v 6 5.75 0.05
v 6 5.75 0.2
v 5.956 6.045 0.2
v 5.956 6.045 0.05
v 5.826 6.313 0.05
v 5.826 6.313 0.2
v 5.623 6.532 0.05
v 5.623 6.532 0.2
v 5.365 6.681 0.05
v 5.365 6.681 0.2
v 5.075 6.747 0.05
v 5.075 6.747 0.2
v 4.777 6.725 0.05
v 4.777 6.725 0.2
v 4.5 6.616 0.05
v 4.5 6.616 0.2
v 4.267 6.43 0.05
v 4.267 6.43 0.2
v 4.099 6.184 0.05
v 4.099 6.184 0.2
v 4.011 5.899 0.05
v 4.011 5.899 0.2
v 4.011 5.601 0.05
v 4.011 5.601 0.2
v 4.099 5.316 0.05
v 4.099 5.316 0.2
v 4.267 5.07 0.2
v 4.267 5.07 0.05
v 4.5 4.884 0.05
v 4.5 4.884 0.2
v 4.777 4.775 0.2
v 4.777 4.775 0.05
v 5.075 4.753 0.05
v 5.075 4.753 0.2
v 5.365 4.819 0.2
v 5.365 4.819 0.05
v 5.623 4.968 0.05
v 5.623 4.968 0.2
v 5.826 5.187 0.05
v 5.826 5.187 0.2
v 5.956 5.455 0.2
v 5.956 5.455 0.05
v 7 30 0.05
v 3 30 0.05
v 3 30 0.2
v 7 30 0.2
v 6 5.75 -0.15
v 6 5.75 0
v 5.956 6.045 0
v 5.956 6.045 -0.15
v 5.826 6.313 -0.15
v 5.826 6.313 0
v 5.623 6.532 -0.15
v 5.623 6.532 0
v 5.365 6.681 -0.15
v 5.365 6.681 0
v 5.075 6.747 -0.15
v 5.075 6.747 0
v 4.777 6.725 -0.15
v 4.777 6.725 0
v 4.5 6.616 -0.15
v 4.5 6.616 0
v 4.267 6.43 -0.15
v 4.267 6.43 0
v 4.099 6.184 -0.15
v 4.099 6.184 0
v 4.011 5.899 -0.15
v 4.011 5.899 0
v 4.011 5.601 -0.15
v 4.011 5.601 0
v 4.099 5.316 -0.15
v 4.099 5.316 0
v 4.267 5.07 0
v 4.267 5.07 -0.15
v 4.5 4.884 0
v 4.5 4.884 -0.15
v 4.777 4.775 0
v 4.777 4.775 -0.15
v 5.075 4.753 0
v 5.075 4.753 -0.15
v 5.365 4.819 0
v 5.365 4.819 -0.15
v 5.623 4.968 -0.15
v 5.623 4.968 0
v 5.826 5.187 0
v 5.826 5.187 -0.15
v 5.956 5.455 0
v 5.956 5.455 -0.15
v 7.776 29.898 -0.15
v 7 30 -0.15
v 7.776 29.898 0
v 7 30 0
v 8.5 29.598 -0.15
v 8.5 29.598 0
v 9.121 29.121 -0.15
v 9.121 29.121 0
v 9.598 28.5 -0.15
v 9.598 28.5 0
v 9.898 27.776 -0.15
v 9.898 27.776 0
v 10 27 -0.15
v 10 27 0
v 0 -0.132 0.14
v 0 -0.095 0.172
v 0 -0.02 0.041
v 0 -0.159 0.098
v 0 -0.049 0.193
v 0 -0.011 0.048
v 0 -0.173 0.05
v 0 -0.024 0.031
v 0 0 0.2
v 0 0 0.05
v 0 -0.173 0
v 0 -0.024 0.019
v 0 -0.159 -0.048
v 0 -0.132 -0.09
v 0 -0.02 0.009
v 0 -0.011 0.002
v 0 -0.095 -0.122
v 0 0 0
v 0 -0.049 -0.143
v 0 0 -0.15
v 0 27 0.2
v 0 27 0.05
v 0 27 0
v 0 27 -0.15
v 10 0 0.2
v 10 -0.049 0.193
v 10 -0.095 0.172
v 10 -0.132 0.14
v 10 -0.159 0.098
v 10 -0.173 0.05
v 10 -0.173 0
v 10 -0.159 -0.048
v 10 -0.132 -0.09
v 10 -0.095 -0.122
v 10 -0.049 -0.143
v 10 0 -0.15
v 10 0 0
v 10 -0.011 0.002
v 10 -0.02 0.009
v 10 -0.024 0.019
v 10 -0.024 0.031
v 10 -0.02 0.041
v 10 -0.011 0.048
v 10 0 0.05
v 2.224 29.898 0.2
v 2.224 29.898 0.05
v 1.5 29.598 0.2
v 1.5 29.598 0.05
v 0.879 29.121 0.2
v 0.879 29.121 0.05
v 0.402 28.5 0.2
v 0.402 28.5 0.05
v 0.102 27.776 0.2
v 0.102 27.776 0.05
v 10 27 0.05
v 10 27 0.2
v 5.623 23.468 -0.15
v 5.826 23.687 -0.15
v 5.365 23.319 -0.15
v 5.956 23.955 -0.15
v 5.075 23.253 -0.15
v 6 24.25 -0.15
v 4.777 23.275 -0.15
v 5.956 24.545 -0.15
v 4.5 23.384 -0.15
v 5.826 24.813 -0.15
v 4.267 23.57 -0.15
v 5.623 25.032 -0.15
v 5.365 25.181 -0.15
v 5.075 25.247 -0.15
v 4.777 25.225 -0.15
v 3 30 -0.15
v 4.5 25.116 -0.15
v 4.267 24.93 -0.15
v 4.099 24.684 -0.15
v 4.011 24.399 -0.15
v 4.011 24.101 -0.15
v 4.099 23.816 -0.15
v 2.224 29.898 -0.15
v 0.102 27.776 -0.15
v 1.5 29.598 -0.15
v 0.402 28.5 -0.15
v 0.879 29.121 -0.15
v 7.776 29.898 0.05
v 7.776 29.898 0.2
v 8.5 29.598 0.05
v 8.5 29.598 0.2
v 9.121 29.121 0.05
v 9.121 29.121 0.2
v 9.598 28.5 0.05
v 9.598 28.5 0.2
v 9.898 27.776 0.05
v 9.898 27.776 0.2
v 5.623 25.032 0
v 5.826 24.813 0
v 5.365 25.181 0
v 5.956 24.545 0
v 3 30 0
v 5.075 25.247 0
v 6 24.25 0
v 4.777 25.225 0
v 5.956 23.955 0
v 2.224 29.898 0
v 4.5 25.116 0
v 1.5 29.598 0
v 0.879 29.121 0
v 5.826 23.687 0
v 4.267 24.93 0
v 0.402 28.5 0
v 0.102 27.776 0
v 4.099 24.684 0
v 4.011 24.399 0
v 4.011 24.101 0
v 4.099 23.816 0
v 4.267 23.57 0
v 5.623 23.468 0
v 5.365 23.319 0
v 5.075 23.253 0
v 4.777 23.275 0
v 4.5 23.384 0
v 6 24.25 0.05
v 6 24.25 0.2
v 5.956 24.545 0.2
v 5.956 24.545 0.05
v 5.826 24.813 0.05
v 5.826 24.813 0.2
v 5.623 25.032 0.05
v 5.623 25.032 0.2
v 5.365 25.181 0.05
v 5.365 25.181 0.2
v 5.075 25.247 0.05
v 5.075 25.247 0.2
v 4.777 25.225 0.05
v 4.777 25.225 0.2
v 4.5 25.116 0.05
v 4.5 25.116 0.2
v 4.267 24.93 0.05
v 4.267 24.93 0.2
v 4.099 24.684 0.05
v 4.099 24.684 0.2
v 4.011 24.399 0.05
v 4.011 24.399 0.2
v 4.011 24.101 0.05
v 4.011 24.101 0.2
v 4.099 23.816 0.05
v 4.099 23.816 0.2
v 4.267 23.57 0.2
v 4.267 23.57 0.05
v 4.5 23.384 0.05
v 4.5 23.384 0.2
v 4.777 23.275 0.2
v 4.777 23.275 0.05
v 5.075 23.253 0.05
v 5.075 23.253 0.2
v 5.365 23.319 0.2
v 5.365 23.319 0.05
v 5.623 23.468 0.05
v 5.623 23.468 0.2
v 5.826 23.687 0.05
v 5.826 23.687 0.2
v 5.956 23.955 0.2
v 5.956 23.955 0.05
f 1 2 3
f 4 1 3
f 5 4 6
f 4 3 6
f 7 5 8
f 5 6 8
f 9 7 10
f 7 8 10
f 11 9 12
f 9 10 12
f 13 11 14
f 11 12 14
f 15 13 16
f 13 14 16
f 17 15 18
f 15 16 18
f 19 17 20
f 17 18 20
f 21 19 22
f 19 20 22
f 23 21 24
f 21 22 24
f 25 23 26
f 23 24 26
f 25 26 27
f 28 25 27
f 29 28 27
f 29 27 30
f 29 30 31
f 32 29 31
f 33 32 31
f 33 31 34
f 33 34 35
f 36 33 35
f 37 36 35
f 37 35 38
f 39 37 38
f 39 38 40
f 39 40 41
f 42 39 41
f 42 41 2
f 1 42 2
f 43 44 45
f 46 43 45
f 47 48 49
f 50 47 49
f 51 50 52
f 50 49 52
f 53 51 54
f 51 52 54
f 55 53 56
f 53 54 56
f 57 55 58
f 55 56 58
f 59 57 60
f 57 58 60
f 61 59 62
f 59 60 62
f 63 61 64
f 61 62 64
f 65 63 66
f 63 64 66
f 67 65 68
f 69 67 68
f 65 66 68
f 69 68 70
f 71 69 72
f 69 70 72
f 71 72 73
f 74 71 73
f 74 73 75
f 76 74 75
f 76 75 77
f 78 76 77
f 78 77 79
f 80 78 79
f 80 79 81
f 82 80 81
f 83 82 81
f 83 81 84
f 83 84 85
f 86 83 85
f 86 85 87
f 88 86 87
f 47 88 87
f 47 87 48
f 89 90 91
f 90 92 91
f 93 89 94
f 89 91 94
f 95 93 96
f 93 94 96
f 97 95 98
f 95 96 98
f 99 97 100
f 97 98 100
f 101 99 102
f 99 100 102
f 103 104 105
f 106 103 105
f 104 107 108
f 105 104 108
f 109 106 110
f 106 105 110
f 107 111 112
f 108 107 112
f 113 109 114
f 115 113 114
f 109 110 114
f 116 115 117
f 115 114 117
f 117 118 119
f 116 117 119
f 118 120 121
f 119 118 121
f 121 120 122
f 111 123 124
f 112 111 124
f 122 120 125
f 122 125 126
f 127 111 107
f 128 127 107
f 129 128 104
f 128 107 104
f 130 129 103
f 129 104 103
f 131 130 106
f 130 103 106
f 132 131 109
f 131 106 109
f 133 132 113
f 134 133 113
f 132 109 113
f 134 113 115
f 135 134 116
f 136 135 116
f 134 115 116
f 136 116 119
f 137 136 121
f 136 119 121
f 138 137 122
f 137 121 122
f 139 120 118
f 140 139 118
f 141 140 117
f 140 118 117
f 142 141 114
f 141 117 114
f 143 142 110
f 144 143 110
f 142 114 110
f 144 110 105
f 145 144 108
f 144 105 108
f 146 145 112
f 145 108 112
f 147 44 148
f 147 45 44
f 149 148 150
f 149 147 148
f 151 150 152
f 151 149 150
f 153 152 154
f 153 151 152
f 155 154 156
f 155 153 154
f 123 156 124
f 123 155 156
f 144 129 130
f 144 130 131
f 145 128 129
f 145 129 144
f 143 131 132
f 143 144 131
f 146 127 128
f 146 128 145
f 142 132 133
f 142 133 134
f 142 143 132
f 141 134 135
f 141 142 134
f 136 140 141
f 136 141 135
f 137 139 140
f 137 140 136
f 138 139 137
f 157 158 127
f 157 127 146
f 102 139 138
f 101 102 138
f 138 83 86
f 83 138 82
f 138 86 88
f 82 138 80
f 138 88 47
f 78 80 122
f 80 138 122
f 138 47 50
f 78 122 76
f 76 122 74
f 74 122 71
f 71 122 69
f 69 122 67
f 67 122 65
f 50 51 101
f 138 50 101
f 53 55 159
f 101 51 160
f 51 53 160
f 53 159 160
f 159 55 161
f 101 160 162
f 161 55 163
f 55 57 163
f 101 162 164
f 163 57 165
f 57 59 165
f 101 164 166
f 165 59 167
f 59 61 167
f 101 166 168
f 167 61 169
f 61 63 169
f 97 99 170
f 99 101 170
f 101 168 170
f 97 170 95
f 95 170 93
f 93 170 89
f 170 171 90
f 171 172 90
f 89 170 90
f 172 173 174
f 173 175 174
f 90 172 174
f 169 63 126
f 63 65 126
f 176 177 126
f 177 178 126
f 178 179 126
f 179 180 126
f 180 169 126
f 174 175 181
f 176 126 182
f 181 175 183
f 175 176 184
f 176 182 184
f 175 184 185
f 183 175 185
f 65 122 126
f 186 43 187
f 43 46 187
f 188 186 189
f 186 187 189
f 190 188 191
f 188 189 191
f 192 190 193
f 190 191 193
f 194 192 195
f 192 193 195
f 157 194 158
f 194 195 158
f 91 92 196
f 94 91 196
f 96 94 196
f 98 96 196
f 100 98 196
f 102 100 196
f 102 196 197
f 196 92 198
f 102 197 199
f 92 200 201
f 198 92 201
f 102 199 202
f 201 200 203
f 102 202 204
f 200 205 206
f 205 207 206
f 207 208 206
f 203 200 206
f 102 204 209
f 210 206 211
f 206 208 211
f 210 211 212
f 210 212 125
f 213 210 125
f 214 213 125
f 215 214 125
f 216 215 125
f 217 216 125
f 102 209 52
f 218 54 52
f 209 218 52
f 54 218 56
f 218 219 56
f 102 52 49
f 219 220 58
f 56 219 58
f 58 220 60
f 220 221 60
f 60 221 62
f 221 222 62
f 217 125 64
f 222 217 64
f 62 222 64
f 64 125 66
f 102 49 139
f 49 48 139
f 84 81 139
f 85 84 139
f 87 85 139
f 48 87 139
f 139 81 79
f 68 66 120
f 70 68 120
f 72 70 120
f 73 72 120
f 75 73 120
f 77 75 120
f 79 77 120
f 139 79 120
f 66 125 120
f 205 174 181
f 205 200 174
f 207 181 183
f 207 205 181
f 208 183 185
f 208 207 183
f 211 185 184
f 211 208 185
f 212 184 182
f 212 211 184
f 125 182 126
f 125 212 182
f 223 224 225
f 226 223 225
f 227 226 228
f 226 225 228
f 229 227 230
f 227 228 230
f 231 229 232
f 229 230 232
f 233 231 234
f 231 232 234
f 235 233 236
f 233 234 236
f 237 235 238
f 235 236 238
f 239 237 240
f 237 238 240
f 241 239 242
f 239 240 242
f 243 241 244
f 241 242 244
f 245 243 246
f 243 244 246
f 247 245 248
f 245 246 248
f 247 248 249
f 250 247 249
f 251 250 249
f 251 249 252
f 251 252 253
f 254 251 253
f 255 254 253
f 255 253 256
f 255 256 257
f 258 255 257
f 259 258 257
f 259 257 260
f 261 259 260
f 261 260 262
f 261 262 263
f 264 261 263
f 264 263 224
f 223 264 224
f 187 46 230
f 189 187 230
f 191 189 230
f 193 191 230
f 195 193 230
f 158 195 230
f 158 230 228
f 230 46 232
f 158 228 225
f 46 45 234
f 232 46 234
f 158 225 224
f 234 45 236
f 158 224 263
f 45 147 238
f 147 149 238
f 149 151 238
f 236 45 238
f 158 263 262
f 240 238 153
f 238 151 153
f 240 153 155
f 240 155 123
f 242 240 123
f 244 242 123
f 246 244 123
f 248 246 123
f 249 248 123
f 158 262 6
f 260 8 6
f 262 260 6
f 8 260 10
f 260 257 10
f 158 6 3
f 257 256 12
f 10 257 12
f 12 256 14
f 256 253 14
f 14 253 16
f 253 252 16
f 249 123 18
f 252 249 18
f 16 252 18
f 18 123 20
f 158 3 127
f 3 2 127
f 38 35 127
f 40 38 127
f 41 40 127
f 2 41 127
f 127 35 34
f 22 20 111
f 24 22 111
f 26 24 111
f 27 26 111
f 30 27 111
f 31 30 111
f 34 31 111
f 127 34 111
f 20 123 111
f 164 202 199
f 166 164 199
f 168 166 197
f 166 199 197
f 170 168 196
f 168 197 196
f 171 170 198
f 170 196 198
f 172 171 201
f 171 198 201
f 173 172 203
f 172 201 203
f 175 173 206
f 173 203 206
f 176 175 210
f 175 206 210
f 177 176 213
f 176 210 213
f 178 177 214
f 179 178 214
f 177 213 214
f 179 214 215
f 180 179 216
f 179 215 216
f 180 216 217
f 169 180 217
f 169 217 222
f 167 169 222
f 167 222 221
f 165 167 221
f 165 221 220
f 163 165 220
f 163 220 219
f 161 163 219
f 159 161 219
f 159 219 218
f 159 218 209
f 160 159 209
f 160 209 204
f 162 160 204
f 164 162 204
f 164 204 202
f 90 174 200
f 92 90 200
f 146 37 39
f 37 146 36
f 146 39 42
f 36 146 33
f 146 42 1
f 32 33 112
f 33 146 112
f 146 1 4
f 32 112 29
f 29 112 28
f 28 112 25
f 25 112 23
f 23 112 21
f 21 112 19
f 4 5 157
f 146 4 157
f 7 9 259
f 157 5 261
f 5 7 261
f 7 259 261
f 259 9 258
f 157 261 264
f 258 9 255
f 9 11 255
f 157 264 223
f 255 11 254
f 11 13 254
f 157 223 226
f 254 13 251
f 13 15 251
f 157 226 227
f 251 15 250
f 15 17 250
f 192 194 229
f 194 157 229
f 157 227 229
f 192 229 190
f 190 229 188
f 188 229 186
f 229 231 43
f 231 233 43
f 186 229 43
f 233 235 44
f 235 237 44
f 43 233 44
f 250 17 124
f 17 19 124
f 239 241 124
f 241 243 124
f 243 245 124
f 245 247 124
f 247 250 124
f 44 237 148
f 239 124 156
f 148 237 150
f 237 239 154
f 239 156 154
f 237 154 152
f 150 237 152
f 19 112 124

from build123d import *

# Parameters (mm, degrees)
BOSS_EXTRUDE1_DEPTH     = 10
FILLET1_R               = 3
SKETCH2_R               = 1
CUT_EXTRUDE1_DEPTH      = 1
CUT_EXTRUDE1_DEPTH_BACK = 1.35


with BuildPart() as part:
    # Sketch1 → Boss-Extrude1 (new body)
    with BuildSketch(Plane(origin=(0, 0, 0), x_dir=(0, 0, -1), z_dir=(1, 0, 0))):
        with BuildLine():
            Line((0, 30), (0, 0))
            ThreePointArc((0, 0), (-0.025, -0.025), (-0.05, 0))
            Line((-0.05, 0), (-0.05, 30))
            Line((-0.05, 30), (-0.2, 30))
            Line((-0.2, 30), (-0.2, 0))
            ThreePointArc((-0.2, 0), (-0.025, -0.175), (0.15, 0))
            Line((0.15, 0), (0.15, 30))
            Line((0.15, 30), (0, 30))
        make_face()
    extrude(amount=BOSS_EXTRUDE1_DEPTH)

    # Fillet1
    fillet1_edges = [part.edges().sort_by_distance(p)[0] for p in [
        (0, 30, -0.075),
        (10, 30, 0.125),
        (10, 30, -0.075),
        (0, 30, 0.125),
    ]]
    fillet(fillet1_edges, radius=FILLET1_R)

    # Sketch2 → Cut-Extrude1 (cut, two sides)
    with BuildSketch(Plane.XY.offset(0.2)) as cut_extrude1_sk:
        with Locations((5, 24.25)):
            Circle(SKETCH2_R)
        with Locations((5, 5.75)):
            Circle(SKETCH2_R)
    extrude(amount=CUT_EXTRUDE1_DEPTH, mode=Mode.SUBTRACT)
    extrude(cut_extrude1_sk.sketch, amount=-CUT_EXTRUDE1_DEPTH_BACK, mode=Mode.SUBTRACT)


solid = part.part
